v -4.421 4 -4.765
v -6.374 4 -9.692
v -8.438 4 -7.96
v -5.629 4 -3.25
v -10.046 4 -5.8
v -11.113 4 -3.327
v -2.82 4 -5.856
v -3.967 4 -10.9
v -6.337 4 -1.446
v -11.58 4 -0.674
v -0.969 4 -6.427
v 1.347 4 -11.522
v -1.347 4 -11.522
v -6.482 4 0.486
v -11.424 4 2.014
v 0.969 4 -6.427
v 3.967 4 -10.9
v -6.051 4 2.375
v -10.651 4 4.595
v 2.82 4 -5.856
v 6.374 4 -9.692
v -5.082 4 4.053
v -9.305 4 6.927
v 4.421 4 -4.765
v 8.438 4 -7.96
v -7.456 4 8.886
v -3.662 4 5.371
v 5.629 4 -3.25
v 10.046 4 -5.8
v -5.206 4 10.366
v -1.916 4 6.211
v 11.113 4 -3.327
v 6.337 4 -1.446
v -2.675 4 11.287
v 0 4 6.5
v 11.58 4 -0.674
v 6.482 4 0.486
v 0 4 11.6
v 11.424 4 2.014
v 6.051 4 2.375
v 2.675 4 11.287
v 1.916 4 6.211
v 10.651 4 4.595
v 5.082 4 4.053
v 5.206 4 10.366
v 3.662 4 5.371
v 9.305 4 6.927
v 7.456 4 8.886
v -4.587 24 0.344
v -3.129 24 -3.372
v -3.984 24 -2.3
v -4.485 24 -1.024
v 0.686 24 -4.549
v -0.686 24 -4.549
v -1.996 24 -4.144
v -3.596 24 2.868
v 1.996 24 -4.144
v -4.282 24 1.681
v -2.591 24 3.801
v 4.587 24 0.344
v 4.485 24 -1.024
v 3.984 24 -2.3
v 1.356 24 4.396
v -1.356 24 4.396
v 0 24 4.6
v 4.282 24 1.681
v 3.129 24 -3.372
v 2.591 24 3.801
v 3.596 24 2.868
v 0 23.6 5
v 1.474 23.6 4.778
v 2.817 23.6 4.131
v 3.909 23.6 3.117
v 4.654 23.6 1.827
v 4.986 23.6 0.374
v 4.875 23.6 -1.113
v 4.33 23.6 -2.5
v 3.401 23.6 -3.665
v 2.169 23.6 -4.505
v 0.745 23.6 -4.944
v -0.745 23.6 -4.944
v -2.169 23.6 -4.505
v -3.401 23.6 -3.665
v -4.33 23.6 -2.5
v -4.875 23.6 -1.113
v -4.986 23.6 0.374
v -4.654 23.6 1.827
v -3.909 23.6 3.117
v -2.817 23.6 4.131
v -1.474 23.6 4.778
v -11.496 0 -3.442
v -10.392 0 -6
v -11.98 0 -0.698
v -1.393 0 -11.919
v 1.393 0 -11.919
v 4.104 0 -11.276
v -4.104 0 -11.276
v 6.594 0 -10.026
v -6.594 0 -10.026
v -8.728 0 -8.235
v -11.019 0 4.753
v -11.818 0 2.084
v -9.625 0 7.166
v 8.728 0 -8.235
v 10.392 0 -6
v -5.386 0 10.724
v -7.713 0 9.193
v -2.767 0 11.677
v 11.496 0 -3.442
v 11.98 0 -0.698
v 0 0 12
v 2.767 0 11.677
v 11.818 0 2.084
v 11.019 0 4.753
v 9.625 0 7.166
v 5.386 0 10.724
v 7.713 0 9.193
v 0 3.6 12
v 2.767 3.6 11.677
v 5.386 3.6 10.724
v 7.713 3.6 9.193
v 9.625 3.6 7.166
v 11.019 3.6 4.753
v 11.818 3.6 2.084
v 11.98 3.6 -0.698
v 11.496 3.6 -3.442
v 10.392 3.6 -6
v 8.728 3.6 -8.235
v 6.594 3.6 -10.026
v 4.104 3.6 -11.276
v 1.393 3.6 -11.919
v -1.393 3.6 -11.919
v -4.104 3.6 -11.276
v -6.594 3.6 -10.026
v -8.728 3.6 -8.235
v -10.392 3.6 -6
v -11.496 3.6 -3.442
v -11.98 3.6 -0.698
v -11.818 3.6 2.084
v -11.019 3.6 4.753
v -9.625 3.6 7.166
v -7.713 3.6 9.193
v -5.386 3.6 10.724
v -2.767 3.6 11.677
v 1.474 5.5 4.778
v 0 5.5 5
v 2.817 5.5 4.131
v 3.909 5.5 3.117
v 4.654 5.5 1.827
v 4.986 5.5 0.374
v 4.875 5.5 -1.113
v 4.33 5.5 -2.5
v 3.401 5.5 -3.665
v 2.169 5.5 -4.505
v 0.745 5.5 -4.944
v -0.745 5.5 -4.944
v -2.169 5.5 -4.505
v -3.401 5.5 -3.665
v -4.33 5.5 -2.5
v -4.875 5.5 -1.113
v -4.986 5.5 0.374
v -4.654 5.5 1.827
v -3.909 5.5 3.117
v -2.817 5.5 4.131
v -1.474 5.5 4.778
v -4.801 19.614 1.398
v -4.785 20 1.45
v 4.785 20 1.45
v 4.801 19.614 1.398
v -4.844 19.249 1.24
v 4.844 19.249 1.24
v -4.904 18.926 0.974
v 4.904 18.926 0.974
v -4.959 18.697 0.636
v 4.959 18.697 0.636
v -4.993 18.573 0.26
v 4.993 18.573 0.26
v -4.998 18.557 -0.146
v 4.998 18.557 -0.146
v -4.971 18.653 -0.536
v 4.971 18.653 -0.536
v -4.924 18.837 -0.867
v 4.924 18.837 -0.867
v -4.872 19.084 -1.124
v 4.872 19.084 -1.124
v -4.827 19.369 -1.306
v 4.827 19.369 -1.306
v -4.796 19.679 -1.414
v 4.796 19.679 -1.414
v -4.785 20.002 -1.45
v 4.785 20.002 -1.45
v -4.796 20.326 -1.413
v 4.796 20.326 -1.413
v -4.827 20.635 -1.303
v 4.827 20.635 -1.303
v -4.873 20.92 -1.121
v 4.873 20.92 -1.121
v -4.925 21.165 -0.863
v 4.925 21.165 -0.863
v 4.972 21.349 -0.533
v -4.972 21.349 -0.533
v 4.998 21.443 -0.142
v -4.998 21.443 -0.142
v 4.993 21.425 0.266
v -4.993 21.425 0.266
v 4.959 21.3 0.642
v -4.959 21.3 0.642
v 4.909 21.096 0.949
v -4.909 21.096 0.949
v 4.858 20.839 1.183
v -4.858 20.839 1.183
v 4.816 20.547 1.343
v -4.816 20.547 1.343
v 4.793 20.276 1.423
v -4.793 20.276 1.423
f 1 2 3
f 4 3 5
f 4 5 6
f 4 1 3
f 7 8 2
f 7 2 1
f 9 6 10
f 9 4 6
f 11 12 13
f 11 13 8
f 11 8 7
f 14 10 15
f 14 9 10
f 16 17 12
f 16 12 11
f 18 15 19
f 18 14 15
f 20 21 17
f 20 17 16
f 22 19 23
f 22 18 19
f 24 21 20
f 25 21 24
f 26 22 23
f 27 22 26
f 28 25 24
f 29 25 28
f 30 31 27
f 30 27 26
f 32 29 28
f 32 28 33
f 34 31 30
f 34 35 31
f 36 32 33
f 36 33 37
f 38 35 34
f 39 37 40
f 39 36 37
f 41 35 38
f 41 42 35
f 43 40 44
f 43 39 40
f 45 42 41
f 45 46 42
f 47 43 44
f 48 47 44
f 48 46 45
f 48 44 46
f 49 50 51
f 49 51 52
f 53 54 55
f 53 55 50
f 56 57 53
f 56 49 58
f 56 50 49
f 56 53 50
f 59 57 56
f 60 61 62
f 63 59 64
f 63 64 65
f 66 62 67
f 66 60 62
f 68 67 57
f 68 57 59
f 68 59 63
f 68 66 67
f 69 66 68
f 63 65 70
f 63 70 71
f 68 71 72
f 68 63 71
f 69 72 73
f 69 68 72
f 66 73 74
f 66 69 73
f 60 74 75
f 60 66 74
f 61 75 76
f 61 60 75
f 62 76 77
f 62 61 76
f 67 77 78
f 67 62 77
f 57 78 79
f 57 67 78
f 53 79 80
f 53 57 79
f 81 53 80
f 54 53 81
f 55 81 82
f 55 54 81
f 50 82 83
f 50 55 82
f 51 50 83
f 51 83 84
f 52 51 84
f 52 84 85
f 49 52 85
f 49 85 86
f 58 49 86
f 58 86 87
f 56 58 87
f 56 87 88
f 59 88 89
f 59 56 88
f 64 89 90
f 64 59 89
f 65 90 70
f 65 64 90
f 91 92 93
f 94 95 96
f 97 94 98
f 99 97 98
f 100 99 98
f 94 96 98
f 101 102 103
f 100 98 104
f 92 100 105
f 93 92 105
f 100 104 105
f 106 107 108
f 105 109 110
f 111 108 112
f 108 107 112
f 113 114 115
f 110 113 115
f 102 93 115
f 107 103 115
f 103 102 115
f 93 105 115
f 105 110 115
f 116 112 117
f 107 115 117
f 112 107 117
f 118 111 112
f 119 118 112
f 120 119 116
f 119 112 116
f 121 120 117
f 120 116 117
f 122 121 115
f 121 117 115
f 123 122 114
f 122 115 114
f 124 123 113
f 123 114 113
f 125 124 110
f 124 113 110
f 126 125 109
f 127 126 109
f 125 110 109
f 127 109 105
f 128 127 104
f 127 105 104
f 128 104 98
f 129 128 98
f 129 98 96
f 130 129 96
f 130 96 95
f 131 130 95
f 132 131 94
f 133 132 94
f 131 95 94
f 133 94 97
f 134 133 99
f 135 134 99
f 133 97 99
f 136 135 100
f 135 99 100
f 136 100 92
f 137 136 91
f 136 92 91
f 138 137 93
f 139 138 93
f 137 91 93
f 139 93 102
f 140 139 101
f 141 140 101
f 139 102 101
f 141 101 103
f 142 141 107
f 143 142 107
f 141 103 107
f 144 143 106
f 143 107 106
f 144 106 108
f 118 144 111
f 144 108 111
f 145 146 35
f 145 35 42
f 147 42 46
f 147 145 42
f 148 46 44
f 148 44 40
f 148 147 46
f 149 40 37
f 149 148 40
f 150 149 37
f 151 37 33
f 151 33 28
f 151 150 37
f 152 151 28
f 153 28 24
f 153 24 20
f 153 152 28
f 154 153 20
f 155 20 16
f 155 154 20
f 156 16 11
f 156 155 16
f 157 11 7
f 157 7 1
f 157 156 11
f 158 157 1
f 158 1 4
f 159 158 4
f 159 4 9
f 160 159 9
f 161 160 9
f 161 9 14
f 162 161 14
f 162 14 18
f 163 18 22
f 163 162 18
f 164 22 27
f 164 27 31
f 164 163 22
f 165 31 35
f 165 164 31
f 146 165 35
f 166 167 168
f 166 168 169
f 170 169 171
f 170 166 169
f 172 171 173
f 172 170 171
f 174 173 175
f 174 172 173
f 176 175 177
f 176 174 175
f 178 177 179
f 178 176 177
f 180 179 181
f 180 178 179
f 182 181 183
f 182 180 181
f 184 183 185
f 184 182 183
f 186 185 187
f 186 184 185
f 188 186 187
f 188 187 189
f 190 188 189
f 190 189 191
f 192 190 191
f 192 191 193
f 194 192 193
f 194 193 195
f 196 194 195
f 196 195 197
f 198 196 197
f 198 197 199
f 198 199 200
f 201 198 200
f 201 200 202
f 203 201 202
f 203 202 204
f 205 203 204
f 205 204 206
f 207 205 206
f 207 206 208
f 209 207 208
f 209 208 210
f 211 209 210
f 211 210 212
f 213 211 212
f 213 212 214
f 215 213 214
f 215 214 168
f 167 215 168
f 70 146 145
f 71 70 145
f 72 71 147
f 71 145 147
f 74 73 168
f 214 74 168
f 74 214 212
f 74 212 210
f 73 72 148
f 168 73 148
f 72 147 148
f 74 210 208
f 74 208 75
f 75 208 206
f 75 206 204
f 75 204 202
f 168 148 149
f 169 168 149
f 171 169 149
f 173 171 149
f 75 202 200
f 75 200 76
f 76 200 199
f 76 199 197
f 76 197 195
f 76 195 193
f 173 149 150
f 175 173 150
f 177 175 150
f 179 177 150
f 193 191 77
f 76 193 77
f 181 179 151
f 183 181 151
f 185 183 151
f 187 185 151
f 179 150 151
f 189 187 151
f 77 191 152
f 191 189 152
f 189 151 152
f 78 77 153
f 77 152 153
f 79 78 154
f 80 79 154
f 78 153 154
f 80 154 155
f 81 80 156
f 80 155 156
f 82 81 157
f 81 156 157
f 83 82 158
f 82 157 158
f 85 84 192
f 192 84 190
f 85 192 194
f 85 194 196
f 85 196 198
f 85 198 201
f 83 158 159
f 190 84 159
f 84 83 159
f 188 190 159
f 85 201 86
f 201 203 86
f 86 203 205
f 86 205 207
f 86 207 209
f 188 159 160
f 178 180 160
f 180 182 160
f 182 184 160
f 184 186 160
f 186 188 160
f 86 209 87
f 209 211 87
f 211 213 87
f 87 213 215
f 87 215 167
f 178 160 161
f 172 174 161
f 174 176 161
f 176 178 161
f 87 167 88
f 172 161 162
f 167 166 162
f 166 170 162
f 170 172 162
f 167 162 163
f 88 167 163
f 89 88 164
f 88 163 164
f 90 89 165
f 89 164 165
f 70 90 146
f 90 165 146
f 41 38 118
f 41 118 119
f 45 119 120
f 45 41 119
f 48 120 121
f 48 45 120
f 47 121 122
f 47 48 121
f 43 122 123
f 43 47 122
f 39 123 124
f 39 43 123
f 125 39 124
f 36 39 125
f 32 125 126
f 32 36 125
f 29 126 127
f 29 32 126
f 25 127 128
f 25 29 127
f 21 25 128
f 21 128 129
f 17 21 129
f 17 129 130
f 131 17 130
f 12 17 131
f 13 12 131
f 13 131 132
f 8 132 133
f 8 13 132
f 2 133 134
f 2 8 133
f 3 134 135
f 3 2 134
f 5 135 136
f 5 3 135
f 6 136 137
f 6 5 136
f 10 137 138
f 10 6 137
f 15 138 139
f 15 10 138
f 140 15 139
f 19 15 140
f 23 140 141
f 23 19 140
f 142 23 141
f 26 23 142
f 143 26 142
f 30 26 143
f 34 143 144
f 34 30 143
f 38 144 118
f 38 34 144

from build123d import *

# Parameters (mm, degrees)
SKETCH_1_R               = 12
EXTRUDE_1_DEPTH          = 4
SKETCH_2_R               = 5
EXTRUDE_2_DEPTH          = 20
CHAMFER_1_SIZE           = 0.4
CUT_EXTRUDE_1_DEPTH      = 30.393876913
CUT_EXTRUDE_1_DEPTH_BACK = 30.393876913
SKETCH_4_R               = 1.45
CHAMFER_2_SIZE           = 1.5


with BuildPart() as part:
    # 草图1 → 凸台-拉伸1 (new body)
    with BuildSketch(Plane(origin=(0, 0, 0), x_dir=(1, 0, 0), z_dir=(0, 1, 0))):
        with Locations(Location((0, 0, 0), (0, 0, 270))):
            Circle(SKETCH_1_R)
    extrude(amount=EXTRUDE_1_DEPTH)

    # 草图2 → 凸台-拉伸2 (add)
    with BuildSketch(Plane(origin=(0, 4, 0), x_dir=(1, 0, 0), z_dir=(0, 1, 0))):
        with Locations(Location((0, 0, 0), (0, 0, 270))):
            Circle(SKETCH_2_R)
    extrude(amount=EXTRUDE_2_DEPTH)

    # 倒角1
    chamfer_1_edges = [part.edges().sort_by_distance(p)[0] for p in [
        (0, 4, -12),
        (0, 24, -5),
    ]]
    chamfer(chamfer_1_edges, length=CHAMFER_1_SIZE)

    # 草图4 → 切除-拉伸1 (cut, two sides: drawn at the far end of the back side and taken through both)
    with BuildSketch(Plane(origin=(0, 0, 0), x_dir=(0, 0, -1), z_dir=(1, 0, 0)).offset(-CUT_EXTRUDE_1_DEPTH_BACK)):
        with Locations(Location((0, 20, 0), (0, 0, 180))):
            Circle(SKETCH_4_R)
    extrude(amount=CUT_EXTRUDE_1_DEPTH + CUT_EXTRUDE_1_DEPTH_BACK, mode=Mode.SUBTRACT)

    # 倒角2
    chamfer_2_edges = [part.edges().sort_by_distance(p)[0] for p in [
        (0, 4, -5),
    ]]
    chamfer(chamfer_2_edges, length=CHAMFER_2_SIZE)


solid = part.part
